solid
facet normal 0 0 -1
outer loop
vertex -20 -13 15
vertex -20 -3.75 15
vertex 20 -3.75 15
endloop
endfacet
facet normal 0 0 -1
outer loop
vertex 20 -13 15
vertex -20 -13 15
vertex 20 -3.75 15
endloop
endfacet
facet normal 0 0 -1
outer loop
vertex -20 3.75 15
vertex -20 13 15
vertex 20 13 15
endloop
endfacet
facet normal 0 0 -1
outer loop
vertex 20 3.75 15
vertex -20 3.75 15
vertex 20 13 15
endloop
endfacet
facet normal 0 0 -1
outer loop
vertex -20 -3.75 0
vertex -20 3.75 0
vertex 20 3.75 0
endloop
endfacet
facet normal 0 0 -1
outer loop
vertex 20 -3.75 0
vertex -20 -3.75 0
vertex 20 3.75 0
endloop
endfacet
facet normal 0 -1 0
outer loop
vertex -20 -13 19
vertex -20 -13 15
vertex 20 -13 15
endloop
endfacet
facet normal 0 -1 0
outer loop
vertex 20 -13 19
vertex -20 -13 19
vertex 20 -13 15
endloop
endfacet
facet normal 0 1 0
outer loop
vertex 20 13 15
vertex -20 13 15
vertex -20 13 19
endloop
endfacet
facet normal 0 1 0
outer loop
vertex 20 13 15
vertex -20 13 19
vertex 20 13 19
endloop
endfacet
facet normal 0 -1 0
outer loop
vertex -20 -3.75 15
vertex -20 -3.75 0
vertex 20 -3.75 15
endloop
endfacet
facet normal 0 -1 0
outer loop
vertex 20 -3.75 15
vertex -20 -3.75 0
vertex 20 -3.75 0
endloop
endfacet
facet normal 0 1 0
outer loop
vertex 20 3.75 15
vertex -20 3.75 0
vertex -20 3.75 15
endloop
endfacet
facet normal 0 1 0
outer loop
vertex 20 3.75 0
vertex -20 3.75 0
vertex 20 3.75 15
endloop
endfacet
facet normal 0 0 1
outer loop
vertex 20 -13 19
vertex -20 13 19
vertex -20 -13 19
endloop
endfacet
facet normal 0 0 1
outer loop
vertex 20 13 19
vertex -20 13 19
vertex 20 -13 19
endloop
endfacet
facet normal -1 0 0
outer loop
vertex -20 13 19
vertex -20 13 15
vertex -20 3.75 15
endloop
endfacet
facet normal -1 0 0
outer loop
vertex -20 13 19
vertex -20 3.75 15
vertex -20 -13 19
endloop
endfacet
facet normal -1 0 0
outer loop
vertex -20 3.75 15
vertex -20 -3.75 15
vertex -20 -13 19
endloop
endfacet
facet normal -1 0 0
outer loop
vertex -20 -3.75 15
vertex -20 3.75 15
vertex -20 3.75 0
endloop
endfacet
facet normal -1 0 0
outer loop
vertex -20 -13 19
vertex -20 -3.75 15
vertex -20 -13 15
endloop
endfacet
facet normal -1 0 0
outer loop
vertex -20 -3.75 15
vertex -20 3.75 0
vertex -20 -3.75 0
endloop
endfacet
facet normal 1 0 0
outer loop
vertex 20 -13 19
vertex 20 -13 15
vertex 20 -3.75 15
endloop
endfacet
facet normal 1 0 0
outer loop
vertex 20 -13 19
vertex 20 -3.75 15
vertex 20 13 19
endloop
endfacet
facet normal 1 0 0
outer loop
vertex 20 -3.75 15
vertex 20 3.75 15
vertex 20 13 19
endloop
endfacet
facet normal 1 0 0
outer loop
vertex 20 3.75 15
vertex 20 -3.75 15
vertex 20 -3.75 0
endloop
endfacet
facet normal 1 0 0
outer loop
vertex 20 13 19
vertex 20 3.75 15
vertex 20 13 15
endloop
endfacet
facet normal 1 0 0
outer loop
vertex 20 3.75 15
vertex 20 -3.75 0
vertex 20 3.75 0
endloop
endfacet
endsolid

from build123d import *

# Parameters (mm, degrees)
F0_W     = 40
F0_H     = 7.5
F1_DEPTH = 15
F2_W     = 40
F2_H     = 9.25
F2_H_2   = 7.5
F3_DEPTH = 4


with BuildPart() as f1:
    # F0 (on Top) → F1 (new body)
    with BuildSketch(Plane.XY):
        Rectangle(F0_W, F0_H)
    extrude(amount=F1_DEPTH)

    # F2 (on face) → F3 (join)
    with BuildSketch(Plane.XY.offset(15)):
        with Locations((0, 8.375)):
            Rectangle(F2_W, F2_H)
        Rectangle(F2_W, F2_H_2)
        with Locations((0, -8.375)):
            Rectangle(F2_W, F2_H)
    extrude(amount=F3_DEPTH)


solid = f1.part
